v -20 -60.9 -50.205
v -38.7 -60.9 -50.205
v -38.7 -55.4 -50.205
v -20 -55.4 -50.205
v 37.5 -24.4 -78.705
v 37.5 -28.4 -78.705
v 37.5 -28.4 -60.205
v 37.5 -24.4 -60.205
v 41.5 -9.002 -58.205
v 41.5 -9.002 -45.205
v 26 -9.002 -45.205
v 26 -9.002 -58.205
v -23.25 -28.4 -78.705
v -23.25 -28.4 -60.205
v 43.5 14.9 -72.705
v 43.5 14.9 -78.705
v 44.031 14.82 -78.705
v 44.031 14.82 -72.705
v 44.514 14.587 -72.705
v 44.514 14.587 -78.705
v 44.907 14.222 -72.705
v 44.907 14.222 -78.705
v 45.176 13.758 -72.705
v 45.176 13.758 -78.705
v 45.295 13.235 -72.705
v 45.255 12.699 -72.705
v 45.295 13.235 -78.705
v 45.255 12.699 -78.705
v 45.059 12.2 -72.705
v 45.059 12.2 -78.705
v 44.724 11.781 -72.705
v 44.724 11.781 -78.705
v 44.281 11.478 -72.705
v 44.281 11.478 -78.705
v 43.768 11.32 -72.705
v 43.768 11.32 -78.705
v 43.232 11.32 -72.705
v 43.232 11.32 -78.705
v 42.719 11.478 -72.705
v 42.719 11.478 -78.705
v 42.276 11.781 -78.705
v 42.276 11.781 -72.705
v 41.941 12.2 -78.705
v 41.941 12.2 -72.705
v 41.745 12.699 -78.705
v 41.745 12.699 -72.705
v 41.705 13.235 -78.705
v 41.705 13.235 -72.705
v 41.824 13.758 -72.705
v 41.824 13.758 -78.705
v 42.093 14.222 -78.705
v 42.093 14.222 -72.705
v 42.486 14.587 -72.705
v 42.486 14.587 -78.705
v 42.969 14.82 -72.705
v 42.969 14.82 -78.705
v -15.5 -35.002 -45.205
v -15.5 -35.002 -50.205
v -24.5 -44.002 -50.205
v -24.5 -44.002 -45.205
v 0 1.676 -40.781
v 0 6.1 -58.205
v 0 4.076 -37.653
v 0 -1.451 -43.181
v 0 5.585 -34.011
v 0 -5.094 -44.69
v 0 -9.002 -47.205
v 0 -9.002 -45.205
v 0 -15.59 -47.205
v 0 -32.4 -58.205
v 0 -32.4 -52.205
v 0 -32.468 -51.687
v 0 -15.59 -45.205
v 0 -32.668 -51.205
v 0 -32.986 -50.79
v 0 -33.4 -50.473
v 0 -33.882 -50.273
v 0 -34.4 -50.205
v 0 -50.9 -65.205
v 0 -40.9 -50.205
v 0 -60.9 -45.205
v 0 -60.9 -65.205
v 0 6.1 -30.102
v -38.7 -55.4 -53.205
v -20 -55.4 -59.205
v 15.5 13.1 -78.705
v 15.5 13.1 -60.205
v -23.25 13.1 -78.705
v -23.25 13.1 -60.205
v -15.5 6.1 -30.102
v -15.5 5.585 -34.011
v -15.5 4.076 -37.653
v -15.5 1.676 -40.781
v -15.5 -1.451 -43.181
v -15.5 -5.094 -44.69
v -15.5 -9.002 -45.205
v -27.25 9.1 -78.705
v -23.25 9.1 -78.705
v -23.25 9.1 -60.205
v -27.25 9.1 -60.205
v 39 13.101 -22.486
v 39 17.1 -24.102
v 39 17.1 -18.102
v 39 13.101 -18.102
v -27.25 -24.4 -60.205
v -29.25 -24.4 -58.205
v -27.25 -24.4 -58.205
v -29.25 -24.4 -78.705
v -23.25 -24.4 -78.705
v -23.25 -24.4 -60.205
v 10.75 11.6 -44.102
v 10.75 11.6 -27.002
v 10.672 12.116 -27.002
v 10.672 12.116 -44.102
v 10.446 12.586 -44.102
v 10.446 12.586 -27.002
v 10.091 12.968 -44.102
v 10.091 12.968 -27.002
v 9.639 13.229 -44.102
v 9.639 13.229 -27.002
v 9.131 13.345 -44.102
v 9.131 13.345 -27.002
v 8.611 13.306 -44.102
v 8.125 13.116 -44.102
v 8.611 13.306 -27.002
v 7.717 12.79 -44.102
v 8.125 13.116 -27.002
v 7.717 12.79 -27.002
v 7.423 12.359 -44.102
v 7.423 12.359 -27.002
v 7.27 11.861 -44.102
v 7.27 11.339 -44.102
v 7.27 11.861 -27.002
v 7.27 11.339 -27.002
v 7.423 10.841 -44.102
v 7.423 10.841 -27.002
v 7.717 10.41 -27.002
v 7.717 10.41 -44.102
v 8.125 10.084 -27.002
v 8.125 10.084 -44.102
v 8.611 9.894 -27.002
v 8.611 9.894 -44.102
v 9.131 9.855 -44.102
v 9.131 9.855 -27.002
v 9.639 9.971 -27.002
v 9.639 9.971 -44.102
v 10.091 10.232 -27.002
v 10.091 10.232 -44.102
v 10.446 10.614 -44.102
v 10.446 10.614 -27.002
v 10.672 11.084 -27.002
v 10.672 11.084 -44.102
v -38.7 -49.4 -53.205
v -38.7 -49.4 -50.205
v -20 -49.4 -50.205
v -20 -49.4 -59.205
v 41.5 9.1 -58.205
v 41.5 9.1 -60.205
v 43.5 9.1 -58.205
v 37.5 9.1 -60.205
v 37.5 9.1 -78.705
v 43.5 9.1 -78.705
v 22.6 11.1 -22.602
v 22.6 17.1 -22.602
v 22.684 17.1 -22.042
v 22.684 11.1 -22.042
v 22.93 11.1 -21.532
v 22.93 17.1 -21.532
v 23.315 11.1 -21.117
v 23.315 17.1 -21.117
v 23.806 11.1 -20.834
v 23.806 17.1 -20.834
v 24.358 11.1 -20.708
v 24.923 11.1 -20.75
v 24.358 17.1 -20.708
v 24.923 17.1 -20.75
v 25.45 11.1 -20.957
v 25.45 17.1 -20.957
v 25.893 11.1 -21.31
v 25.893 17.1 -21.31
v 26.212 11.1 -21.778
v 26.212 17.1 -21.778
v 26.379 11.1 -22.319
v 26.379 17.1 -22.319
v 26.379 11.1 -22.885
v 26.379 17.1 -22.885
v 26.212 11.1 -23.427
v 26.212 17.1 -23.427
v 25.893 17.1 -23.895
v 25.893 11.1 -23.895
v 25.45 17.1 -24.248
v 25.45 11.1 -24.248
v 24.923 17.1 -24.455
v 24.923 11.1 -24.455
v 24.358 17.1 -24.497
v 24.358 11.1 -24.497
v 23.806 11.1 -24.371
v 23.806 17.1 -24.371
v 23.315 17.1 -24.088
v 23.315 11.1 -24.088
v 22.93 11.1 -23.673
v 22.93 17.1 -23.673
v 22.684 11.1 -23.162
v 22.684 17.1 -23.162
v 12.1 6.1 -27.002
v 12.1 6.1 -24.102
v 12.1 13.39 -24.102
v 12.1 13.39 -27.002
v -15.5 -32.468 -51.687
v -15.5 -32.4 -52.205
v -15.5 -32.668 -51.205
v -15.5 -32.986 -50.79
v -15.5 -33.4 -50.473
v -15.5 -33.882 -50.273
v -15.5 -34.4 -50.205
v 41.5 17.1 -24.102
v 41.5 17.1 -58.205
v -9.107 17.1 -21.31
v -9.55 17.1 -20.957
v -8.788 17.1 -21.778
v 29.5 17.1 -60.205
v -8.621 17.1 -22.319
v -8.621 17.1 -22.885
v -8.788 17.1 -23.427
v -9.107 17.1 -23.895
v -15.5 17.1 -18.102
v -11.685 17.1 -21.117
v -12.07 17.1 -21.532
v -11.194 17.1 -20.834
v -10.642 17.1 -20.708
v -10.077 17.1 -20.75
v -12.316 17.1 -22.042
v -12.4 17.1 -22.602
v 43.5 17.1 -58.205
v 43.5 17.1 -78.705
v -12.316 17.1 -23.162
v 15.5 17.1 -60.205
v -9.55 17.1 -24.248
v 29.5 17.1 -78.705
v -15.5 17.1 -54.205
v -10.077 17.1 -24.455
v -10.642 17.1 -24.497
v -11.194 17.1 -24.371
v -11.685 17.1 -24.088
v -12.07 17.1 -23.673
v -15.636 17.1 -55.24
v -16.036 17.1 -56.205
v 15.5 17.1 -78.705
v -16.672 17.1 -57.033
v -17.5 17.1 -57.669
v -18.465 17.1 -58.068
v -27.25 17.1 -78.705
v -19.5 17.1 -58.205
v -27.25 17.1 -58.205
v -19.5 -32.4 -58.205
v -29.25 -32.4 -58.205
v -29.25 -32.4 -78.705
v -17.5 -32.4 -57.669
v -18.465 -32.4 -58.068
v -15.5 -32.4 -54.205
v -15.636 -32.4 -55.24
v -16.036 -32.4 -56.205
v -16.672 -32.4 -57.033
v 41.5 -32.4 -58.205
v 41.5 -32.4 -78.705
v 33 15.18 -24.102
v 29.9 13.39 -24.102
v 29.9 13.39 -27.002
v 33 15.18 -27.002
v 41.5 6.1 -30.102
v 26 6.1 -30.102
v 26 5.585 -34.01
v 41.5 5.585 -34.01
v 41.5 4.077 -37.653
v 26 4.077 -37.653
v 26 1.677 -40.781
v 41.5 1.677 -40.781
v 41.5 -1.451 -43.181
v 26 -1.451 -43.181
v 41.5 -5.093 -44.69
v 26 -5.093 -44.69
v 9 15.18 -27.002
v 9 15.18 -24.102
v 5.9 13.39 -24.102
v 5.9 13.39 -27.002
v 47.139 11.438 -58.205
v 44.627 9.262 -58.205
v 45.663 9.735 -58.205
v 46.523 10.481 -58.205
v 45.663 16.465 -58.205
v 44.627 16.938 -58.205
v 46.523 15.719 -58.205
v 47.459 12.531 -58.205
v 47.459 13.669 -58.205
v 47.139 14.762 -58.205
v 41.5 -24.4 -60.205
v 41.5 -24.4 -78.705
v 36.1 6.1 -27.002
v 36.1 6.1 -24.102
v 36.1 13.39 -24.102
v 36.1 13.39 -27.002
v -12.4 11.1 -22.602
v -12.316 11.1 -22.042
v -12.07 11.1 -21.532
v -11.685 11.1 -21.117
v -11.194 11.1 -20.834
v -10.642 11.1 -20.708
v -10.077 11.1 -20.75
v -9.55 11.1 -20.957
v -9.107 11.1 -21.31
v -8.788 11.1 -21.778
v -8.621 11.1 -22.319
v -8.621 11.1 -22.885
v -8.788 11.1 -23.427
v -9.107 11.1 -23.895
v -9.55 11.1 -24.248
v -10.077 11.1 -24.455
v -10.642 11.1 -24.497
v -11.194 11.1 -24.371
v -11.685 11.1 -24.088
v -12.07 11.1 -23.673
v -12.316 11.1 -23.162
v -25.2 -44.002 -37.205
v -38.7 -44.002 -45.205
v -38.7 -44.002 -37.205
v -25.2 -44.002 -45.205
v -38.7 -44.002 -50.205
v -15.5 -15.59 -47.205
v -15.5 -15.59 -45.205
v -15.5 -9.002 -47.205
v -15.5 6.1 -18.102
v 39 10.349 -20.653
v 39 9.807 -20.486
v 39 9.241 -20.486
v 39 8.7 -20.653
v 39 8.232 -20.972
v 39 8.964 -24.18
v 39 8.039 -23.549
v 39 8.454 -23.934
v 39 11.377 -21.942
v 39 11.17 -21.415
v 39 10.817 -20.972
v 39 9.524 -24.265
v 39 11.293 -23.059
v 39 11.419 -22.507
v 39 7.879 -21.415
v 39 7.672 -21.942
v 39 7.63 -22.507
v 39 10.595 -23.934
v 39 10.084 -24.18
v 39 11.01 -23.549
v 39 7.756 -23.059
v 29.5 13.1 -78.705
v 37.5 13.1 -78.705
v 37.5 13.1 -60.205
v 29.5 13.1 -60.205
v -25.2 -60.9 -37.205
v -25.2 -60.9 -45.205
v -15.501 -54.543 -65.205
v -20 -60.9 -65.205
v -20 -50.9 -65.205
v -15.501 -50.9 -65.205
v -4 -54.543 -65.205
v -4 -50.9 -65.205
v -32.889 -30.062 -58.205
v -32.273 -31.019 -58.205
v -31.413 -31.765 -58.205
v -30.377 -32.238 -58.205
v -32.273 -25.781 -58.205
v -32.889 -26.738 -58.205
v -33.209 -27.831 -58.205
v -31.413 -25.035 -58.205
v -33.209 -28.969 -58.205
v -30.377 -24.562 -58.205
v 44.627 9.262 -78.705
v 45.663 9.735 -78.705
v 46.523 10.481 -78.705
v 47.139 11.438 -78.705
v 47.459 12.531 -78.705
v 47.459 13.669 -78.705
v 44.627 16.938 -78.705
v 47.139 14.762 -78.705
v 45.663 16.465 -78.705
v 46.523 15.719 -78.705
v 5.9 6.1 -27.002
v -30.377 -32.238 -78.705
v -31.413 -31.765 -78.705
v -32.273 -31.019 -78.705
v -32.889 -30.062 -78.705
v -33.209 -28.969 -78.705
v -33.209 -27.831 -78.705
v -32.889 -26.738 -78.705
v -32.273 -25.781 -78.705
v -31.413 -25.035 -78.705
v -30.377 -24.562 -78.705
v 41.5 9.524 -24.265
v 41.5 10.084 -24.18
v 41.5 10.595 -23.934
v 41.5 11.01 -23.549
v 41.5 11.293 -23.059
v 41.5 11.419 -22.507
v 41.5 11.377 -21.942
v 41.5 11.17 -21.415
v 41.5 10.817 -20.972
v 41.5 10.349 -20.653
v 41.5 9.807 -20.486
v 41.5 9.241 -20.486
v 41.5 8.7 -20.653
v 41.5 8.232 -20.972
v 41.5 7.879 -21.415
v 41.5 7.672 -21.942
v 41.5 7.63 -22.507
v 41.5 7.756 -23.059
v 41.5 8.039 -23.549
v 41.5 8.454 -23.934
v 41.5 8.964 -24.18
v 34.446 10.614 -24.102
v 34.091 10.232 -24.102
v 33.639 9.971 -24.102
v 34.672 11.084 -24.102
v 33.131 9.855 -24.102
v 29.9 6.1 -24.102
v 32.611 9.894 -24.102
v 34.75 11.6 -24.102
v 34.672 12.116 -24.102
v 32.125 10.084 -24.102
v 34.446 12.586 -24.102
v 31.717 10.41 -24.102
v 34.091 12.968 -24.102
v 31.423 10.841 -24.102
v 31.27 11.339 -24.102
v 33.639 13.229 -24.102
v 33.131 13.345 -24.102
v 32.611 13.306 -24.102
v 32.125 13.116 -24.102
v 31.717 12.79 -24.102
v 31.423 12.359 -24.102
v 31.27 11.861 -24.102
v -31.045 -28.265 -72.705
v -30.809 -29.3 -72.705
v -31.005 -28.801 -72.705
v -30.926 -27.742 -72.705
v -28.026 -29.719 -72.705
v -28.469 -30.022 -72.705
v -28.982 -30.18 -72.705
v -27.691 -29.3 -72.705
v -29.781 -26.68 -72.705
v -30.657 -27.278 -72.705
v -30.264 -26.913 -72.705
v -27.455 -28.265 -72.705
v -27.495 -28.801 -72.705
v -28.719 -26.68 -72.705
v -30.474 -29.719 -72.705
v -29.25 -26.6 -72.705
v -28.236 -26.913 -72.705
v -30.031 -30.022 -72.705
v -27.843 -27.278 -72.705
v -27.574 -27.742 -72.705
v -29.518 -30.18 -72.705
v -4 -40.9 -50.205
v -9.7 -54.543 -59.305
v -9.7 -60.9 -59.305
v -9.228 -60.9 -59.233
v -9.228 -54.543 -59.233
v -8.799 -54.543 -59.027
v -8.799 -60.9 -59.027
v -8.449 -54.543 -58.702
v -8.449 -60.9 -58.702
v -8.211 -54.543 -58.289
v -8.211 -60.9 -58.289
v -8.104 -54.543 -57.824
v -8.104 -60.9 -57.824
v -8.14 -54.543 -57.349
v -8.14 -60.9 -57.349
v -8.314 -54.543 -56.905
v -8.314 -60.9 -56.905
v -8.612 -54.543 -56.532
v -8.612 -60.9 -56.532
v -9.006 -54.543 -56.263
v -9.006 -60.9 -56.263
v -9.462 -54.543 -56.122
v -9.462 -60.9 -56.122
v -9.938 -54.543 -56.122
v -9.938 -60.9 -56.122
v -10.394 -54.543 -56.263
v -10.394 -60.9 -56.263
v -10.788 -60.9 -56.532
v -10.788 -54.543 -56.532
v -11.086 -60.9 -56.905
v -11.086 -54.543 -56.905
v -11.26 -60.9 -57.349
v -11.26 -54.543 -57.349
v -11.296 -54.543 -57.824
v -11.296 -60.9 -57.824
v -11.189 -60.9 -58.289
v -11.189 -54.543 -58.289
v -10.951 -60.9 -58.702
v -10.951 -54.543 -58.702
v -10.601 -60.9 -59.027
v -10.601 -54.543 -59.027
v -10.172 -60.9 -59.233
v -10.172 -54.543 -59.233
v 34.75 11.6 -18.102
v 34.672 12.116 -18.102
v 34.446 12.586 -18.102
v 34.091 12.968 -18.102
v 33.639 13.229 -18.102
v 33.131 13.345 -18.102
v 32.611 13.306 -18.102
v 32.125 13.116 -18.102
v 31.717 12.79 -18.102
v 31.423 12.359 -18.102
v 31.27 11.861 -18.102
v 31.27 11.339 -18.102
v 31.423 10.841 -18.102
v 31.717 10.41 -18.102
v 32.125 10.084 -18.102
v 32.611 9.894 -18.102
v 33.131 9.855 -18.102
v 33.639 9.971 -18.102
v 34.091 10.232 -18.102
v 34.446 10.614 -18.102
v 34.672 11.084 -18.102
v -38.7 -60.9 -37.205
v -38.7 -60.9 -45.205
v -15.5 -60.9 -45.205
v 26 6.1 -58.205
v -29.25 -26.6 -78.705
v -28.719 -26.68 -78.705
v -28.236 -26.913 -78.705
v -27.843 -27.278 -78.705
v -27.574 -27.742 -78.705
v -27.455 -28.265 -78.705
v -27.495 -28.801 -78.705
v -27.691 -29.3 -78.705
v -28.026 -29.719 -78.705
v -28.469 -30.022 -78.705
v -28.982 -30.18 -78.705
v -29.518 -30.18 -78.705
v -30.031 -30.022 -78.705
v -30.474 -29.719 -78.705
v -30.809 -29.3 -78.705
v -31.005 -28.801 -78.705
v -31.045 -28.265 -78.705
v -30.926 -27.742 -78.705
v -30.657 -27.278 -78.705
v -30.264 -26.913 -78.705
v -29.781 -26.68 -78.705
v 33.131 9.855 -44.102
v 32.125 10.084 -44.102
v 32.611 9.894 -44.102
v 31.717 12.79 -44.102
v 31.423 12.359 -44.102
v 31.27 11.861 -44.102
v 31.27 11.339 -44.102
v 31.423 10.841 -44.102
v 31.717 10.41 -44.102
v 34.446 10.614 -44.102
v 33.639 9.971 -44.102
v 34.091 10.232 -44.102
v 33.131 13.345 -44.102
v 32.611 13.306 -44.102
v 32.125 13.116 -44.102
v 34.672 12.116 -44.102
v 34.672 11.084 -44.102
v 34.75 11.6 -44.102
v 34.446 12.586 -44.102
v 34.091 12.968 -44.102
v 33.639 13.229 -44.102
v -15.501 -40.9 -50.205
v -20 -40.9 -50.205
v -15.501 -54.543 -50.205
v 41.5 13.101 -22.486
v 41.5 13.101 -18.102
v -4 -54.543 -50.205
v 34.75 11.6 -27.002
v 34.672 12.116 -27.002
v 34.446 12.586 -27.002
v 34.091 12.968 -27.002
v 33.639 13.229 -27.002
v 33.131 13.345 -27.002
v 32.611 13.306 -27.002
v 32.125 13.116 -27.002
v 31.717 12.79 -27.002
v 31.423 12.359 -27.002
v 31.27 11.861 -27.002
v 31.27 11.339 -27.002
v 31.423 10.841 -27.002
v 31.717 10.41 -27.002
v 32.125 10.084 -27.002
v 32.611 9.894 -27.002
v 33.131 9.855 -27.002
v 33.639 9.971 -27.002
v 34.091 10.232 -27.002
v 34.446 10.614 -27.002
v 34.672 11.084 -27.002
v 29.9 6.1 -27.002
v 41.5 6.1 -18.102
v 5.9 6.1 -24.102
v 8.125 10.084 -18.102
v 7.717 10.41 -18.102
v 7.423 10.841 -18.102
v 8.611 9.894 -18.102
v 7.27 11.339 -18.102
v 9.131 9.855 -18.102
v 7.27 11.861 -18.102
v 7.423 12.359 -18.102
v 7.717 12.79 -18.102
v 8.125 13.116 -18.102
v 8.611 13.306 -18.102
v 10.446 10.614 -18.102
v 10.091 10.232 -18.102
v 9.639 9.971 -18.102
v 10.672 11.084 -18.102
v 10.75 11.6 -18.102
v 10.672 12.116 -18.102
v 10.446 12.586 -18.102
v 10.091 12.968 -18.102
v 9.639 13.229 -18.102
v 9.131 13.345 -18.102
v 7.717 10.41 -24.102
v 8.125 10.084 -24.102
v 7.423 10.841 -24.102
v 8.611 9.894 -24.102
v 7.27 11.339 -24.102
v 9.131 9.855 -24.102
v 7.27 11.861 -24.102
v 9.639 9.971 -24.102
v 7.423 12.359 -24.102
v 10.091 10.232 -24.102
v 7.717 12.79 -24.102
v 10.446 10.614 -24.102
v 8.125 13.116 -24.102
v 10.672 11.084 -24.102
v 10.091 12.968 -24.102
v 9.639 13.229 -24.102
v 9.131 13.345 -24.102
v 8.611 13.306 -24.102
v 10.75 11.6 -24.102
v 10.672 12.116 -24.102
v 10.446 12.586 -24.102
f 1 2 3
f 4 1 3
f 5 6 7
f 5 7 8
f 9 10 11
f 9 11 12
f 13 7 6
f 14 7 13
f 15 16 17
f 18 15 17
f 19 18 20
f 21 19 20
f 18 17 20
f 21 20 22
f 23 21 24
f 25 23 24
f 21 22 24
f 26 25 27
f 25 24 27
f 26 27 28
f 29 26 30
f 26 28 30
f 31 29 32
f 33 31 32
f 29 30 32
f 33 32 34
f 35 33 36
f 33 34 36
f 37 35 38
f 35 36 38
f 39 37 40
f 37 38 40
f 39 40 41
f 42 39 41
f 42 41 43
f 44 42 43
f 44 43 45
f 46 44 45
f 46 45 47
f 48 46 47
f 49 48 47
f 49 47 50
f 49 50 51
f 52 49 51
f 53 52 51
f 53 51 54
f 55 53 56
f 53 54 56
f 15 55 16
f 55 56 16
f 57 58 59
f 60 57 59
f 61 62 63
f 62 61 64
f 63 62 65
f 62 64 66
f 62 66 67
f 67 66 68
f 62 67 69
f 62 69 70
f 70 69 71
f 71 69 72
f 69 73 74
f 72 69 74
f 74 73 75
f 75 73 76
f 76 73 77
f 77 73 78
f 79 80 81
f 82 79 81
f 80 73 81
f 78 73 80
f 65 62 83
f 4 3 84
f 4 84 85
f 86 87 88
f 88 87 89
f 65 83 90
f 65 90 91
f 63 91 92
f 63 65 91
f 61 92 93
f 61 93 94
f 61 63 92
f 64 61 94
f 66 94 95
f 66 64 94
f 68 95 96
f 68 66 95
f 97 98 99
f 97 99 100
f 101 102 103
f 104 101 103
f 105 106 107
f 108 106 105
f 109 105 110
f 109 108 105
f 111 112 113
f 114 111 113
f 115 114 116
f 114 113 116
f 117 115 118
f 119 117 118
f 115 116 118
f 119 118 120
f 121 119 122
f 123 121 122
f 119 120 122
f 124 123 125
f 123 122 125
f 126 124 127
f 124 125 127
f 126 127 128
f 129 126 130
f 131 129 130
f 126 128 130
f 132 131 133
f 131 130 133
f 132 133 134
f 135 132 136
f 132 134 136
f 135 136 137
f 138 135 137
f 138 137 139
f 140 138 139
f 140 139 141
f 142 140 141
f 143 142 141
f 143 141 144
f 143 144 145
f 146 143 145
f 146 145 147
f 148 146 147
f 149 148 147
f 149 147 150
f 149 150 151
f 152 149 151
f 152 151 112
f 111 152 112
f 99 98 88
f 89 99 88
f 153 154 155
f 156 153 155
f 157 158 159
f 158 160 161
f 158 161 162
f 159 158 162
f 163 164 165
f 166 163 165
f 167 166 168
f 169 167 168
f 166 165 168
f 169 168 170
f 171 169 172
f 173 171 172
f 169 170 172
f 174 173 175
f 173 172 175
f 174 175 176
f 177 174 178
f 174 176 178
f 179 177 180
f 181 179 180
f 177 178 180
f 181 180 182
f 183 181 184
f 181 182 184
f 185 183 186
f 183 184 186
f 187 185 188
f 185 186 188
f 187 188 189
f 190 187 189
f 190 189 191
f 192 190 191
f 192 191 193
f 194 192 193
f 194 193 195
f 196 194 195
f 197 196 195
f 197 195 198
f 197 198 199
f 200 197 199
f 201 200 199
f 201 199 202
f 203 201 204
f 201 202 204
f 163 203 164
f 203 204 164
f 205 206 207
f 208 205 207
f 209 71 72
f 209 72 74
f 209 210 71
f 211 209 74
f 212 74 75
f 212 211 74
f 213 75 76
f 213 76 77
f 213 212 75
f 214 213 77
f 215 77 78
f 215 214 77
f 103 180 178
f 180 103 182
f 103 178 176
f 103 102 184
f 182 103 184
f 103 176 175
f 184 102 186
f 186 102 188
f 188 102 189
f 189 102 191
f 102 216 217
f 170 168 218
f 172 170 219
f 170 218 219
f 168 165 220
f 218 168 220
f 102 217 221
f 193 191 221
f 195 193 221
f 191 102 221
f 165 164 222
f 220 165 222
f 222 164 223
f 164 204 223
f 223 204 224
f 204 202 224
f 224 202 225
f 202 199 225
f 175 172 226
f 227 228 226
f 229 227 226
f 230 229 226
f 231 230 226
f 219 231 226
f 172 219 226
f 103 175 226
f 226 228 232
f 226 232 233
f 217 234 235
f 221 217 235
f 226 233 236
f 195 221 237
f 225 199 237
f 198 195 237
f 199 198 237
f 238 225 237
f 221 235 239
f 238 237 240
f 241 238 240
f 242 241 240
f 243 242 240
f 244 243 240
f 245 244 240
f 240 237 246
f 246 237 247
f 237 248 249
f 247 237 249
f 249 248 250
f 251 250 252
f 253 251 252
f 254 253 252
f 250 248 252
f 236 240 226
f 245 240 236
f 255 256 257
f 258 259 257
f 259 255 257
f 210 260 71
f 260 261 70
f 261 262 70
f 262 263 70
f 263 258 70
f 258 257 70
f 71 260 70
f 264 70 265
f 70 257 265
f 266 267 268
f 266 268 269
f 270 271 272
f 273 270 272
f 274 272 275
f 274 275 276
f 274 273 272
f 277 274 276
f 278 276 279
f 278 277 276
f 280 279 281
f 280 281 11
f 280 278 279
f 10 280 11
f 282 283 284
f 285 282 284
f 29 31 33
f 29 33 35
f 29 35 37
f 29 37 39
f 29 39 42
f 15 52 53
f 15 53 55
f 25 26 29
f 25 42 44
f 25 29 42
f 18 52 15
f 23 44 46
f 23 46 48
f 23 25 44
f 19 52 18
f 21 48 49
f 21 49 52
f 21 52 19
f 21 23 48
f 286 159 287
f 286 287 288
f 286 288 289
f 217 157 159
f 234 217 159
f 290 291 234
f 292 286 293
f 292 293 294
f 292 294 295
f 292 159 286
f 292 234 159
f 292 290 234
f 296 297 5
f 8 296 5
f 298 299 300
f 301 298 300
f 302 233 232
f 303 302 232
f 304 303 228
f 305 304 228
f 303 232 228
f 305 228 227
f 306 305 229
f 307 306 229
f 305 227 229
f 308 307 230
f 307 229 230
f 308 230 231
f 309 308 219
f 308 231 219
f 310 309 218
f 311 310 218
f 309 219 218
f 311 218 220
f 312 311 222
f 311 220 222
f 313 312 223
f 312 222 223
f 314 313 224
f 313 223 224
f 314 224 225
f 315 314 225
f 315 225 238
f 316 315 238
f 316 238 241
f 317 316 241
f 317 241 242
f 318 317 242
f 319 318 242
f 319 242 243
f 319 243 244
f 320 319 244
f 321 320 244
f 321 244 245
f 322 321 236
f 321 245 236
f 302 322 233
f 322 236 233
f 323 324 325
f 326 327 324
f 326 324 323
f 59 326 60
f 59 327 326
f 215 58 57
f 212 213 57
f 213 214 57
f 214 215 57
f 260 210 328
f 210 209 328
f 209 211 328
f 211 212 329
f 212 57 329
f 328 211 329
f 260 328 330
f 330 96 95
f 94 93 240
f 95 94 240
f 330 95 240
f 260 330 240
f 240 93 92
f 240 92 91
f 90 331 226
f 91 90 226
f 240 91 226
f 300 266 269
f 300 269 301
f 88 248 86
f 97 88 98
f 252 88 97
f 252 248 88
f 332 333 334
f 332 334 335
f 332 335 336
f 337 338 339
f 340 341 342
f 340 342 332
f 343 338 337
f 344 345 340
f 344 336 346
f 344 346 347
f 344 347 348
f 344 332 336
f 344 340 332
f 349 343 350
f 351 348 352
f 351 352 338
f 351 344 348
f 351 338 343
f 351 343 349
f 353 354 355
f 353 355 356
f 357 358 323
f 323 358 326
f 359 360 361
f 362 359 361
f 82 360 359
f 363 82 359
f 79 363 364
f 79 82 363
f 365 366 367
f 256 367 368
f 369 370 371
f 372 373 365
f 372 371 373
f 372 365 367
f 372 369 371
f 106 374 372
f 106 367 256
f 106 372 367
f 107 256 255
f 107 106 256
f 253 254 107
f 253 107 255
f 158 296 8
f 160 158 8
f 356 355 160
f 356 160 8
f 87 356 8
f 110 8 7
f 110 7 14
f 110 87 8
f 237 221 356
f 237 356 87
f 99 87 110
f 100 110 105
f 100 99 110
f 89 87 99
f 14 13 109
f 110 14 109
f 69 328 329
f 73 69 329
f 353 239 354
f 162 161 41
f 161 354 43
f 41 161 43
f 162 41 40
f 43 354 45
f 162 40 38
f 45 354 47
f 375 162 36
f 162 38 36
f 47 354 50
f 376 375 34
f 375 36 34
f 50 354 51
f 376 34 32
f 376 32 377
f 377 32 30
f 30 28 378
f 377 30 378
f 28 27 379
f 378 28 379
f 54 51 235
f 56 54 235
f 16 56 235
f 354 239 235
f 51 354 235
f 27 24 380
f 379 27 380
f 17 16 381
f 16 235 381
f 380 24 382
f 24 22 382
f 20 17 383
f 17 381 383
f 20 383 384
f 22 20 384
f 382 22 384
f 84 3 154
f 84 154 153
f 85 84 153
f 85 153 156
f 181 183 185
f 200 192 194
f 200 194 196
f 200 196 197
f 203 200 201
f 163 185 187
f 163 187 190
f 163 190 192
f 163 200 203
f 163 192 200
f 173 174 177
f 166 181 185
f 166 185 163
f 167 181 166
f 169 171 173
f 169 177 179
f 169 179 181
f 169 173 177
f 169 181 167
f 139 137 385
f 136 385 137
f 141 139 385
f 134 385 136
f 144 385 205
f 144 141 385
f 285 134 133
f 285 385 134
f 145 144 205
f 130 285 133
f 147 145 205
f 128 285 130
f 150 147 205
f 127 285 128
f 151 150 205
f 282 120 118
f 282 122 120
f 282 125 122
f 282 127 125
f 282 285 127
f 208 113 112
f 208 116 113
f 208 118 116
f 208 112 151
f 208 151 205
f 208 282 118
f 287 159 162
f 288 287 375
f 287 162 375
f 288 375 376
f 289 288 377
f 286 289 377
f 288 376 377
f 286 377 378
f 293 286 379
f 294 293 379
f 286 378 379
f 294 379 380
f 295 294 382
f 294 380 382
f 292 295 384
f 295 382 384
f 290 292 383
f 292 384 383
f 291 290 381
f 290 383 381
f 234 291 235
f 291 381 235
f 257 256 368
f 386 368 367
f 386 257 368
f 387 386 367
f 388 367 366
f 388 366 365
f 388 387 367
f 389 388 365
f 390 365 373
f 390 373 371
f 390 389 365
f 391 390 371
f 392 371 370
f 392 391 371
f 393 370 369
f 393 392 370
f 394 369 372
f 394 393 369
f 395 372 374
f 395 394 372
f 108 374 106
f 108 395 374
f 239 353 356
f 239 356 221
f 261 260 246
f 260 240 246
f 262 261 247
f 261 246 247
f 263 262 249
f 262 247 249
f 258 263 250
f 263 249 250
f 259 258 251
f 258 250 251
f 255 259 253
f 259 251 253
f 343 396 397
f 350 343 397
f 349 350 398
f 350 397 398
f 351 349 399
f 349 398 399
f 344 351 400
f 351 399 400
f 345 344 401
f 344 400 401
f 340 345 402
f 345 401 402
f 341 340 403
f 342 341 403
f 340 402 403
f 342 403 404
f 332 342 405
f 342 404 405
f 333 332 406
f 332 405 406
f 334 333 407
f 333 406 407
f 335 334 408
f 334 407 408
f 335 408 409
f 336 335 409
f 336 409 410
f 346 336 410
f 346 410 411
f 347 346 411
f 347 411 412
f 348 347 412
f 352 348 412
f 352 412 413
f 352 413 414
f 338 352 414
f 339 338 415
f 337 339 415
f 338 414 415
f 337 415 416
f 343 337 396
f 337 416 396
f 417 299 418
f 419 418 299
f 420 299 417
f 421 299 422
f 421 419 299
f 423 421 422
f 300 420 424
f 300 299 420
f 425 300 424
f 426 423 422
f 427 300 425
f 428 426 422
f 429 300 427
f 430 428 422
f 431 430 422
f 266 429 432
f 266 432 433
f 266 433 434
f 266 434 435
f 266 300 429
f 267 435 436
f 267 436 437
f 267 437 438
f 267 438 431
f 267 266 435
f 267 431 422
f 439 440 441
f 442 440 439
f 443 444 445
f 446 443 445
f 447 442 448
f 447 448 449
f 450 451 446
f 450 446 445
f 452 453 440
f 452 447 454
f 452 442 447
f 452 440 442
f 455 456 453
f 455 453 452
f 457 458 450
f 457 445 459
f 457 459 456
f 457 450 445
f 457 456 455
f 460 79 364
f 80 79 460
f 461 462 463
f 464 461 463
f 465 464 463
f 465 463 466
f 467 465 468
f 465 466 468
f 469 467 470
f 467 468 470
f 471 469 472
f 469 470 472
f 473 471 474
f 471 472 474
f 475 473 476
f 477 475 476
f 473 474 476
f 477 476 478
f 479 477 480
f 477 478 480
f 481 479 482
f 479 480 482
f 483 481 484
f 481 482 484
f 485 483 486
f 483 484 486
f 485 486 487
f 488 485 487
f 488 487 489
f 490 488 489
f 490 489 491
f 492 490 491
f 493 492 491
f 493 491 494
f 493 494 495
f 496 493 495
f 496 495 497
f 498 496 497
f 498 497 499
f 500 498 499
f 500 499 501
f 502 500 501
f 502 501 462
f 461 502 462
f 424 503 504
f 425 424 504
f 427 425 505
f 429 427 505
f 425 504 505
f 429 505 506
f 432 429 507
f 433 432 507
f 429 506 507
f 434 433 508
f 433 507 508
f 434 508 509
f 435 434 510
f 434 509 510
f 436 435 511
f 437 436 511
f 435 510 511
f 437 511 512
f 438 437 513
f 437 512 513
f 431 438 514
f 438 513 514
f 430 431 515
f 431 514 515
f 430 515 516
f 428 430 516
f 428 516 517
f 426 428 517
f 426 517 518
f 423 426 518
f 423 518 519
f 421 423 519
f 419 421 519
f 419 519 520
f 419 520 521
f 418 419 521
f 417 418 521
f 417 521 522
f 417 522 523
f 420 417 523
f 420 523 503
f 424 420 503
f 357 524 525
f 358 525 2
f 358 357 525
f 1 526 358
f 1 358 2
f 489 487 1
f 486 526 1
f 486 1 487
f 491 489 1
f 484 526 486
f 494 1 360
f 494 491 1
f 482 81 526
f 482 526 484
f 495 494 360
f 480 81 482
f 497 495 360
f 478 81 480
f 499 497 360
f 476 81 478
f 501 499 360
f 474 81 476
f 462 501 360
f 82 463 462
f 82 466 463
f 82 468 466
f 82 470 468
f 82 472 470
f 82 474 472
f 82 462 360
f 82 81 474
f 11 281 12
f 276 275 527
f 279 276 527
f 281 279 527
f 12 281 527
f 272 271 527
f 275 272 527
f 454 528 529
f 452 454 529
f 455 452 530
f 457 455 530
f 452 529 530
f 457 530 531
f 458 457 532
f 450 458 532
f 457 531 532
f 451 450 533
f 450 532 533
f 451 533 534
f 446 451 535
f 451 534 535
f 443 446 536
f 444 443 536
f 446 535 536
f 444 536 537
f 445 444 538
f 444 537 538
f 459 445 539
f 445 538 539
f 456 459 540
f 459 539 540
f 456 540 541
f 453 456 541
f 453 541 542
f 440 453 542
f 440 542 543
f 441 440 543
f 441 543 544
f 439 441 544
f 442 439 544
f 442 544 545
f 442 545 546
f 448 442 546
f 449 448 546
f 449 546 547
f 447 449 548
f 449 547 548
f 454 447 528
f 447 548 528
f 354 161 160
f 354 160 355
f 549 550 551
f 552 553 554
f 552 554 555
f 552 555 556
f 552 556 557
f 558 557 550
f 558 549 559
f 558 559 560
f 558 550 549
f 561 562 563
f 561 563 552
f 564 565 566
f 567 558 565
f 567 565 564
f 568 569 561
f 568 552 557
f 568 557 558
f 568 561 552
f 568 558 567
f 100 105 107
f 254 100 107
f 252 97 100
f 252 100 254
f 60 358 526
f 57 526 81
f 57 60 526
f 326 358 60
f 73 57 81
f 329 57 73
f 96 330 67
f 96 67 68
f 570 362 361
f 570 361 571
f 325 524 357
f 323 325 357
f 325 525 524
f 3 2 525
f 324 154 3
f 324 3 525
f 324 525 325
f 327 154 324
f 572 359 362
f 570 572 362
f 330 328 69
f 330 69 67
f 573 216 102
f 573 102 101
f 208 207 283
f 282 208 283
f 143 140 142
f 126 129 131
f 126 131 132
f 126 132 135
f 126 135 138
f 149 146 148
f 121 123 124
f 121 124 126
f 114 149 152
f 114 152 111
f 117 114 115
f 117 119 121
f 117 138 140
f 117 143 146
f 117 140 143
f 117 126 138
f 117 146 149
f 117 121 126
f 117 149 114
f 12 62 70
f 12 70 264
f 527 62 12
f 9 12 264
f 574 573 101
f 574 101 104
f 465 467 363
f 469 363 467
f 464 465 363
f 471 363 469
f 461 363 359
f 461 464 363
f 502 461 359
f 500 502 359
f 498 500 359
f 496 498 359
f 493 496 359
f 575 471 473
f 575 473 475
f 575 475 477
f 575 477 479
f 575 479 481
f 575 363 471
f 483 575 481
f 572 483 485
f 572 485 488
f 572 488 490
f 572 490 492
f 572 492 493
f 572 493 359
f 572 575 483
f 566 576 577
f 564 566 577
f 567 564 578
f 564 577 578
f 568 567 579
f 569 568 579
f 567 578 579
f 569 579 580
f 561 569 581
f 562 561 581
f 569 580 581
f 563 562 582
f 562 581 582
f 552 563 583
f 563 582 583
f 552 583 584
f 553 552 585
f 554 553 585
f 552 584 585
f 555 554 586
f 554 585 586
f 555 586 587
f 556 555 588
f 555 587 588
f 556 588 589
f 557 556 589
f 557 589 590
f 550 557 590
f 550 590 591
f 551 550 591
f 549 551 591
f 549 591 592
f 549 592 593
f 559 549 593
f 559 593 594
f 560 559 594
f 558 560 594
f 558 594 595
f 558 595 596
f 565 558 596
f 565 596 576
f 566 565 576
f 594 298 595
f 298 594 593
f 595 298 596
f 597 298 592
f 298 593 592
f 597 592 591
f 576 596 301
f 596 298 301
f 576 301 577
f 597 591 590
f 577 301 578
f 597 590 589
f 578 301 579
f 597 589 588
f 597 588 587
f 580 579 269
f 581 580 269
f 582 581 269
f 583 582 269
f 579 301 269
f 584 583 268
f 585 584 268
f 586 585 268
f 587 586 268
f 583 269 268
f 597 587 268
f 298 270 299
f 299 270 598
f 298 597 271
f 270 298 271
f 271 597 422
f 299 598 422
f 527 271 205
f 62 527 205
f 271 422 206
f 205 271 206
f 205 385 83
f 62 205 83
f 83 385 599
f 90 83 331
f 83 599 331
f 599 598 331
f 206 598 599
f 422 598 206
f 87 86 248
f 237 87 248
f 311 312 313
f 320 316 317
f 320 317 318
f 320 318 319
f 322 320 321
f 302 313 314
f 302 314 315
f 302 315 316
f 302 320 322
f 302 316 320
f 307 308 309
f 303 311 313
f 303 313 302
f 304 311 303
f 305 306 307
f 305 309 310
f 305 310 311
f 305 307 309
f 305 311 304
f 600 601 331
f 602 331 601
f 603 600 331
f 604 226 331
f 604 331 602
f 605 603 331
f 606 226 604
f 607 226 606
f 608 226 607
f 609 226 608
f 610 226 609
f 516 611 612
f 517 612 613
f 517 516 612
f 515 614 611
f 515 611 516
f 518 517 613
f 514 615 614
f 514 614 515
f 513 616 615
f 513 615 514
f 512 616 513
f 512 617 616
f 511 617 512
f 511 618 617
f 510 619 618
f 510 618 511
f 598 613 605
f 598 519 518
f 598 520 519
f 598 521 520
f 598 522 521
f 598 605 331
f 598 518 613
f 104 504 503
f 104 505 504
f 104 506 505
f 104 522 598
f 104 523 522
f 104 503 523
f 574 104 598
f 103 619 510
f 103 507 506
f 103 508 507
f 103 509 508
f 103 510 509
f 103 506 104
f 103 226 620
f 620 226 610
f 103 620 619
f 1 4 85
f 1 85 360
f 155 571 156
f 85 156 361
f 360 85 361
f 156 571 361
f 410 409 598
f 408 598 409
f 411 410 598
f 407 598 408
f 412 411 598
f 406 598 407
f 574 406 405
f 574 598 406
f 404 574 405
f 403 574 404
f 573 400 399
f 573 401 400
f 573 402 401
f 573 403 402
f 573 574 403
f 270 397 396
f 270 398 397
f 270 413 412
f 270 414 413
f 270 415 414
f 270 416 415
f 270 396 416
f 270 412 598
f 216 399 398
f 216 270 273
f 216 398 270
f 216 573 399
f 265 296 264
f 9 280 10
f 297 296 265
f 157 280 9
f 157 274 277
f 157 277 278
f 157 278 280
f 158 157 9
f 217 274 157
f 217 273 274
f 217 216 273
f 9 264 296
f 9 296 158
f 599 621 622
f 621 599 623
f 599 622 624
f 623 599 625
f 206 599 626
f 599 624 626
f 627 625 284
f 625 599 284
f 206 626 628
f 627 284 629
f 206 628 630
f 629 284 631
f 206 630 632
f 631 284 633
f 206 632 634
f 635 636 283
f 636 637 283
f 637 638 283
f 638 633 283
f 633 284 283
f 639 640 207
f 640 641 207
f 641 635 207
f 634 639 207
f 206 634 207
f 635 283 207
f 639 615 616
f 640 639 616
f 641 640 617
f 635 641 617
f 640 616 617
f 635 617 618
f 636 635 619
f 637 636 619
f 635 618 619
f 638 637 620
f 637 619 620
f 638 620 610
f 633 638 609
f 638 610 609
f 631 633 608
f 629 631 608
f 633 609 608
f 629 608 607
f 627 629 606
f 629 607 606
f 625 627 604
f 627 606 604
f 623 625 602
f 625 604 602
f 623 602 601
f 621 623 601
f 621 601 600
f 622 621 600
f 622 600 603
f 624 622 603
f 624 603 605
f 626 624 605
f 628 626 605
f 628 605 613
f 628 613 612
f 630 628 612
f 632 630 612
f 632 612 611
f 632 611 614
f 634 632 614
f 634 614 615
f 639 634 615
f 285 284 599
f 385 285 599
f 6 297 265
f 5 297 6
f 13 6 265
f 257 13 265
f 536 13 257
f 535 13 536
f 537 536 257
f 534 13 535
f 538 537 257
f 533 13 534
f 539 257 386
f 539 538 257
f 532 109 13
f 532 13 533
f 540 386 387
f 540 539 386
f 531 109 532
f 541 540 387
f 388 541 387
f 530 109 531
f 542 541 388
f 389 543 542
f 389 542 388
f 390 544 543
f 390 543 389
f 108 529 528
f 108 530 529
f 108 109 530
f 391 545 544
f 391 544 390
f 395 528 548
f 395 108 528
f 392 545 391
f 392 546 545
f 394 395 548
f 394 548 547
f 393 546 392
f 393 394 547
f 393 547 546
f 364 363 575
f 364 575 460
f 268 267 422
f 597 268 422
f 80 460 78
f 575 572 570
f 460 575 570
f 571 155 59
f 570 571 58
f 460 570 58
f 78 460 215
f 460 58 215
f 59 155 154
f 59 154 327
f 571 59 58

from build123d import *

# Parameters (mm, degrees)
RESSALTO_EXTRUS_O1_DEPTH  = 5
RESSALTO_EXTRUS_O2_DEPTH  = 15.5
RESSALTO_EXTRUS_O3_DEPTH  = 15.5
RESSALTO_EXTRUS_O4_DEPTH  = 20
ESBO_O6_W                 = 5
ESBO_O6_H                 = 16.897720337
RESSALTO_EXTRUS_O5_DEPTH  = 23.2
ESBO_O7_W                 = 13.499987793
ESBO_O7_H                 = 16.897720337
RESSALTO_EXTRUS_O6_DEPTH  = 8
ESBO_O8_W                 = 2.000000014
ESBO_O8_H                 = 6.588073731
CORTE_EXTRUS_O1_DEPTH     = 93.188310305
CHANFRO2_SIZE             = 9
RESSALTO_EXTRUS_O8_DEPTH  = 4.5
RESSALTO_EXTRUS_O7_START  = -5.5
RESSALTO_EXTRUS_O7_DEPTH  = 6
CORTE_EXTRUS_O2_REACH     = 102.674
ESBO_O11_W                = 11.999984741
ESBO_O11_H                = 13.640792847
CORTE_EXTRUS_O4_REACH     = 108.65
ESBO_O13_R                = 1.6
RESSALTO_EXTRUS_O9_DEPTH  = 5
ESBO_O16_W                = 11.500915527
ESBO_O16_H                = 13.642723083
CORTE_EXTRUS_O5_DEPTH     = 101.673633611
RESSALTO_EXTRUS_O13_START = -15.5
ESBO_O18_W                = 32.102264404
ESBO_O18_H                = 11
RESSALTO_EXTRUS_O13_DEPTH = 77.5
ESBO_O27_W                = 32.102264404
ESBO_O27_H                = 11
CORTE_EXTRUS_O8_DEPTH     = 20.5
ESBO_O29_R                = 1.9
CORTE_EXTRUS_O9_DEPTH     = 2.5
ESBO_O30_R                = 1.9
CORTE_EXTRUS_O10_DEPTH    = 6
ESBO_O32_W                = 20
ESBO_O32_H                = 78
CORTE_EXTRUS_O11_DEPTH    = 88.462468019
ESBO_O33_R                = 1.75
CORTE_EXTRUS_O12_DEPTH    = 26
CORTE_EXTRUS_O13_START    = -6
CORTE_EXTRUS_O13_DEPTH    = 2.9
RESSALTO_EXTRUS_O20_DEPTH = 10
ESBO_O40_W                = 68.75
ESBO_O40_H                = 49.5
ESBO_O40_W_2              = 60.75
ESBO_O40_H_2              = 41.5
RESSALTO_EXTRUS_O21_DEPTH = 18.5
ESBO_O41_W                = 11.75
ESBO_O41_H                = 49.5
ESBO_O41_W_2              = 41.5
ESBO_O41_H_2              = 38.5
RESSALTO_EXTRUS_O22_DEPTH = 2
RESSALTO_EXTRUS_O23_DEPTH = 15.5
ESBO_O43_W                = 4
ESBO_O43_H                = 33.5
ESBO_O43_W_2              = 14
ESBO_O43_H_2              = 4
CORTE_EXTRUS_O14_DEPTH    = 18.5
RESSALTO_EXTRUS_O24_DEPTH = 20.5
ESBO_O45_R                = 1.8
CORTE_EXTRUS_O15_DEPTH    = 6
FILETE1_R                 = 4
FILETE2_R                 = 2


with BuildPart() as part:
    # Esboço2 → Ressalto-extrusão1 (new body)
    with BuildSketch(Plane.XY):
        Polygon((0, 0), (0, -60.9), (-20, -60.9), (-20, -25.9), (-15.5, -15.9), (-15.5, 0), align=None)
    extrude(amount=RESSALTO_EXTRUS_O1_DEPTH)

    # Esboço3 → Ressalto-extrusão2 (add)
    with BuildSketch(Plane(origin=(0, 0, 0), x_dir=(0, 0, -1), z_dir=(1, 0, 0))):
        with BuildLine():
            ThreePointArc((6.102294922, 14.1), (-2.871049482, 9.744626932), (-5, 0))
            Line((-5, 0), (0, 0))
            ThreePointArc((0, 0), (1.788130128, 4.313492501), (6.102294922, 6.1))
            Line((6.102294922, 6.1), (30.102294922, 6.1))
            ThreePointArc((30.102294922, 6.099999986), (40.781022689, 1.676452573), (45.204559313, -9.002279663))
            Line((45.204559326, -9.002279663), (45.204559326, -60.9))
            Line((45.204559326, -60.9), (50.204559326, -60.9))
            Line((50.204559326, -60.9), (50.204559326, 14.1))
            Line((50.204559326, 14.1), (6.102294922, 14.1))
        make_face()
    extrude(amount=-RESSALTO_EXTRUS_O2_DEPTH)

    # Esboço4 → Ressalto-extrusão3 (add)
    with BuildSketch(Plane.ZY.offset(15.5)):
        Polygon((-50.204559326, -60.9), (-50.204559326, -40.9), (-65.204559326, -50.9), (-65.204559326, -60.9), align=None)
    extrude(amount=-RESSALTO_EXTRUS_O3_DEPTH)

    # Esboço5 → Ressalto-extrusão4 (add)
    with BuildSketch(Plane.ZY.offset(20)):
        Polygon((5, -60.9), (20, -60.9), (20, -50.9), (5, -40.9), align=None)
    extrude(amount=-RESSALTO_EXTRUS_O4_DEPTH)

    # Esboço6 → Ressalto-extrusão5 (add)
    with BuildSketch(Plane.ZY.offset(15.5)):
        with Locations((-47.704559326, -52.451139832)):
            Rectangle(ESBO_O6_W, ESBO_O6_H)
    extrude(amount=RESSALTO_EXTRUS_O5_DEPTH)

    # Esboço7 → Ressalto-extrusão6 (add)
    with BuildSketch(Plane.XY.offset(-45.204559326)):
        with Locations((-31.950006104, -52.451139832)):
            Rectangle(ESBO_O7_W, ESBO_O7_H)
    extrude(amount=RESSALTO_EXTRUS_O6_DEPTH)

    # Esboço8 → Corte-extrusão1 (cut, through all)
    with BuildSketch(Plane.ZY.offset(15.5)):
        with Locations((-46.204559319, -12.296316529)):
            Rectangle(ESBO_O8_W, ESBO_O8_H)
    extrude(amount=-CORTE_EXTRUS_O1_DEPTH, mode=Mode.SUBTRACT)

    # Chanfro2
    # the kernel refuses this chamfer: 9 mm, written as the material it adds along each edge
    with BuildSketch(Plane(origin=(-15.5, -44.002279663, -50.204559326), x_dir=(0.027495876610586407, 0.9996219169112969, 0), z_dir=(0, 0, 1))) as chanfro2_piece_1:
        Polygon((CHANFRO2_SIZE * 0.999621916911, CHANFRO2_SIZE * 0.0274958766106), (-CHANFRO2_SIZE * 0.0274958766106, CHANFRO2_SIZE * 0.999621916911), (0, 0), align=None)
    extrude(amount=5)

    # Esboço10 → Ressalto-extrusão8 (add)
    with BuildSketch(Plane.ZY.offset(15.5)):
        Polygon((-50.204559326, -40.9), (-50.204559326, -60.9), (-65.204559326, -60.9), (-65.204559326, -50.9), align=None)
    extrude(amount=RESSALTO_EXTRUS_O8_DEPTH)

    # Esboço9 → Ressalto-extrusão7 (add)
    with BuildSketch(Plane.XZ.offset(60.9).offset(RESSALTO_EXTRUS_O7_START)):
        Polygon((-38.7, -50.204559326), (-38.700004578, -53.204559326), (-20, -59.204559326), (-20, -50.204559326), align=None)
    extrude(amount=-RESSALTO_EXTRUS_O7_DEPTH)

    # Corte-extrusão2: up to this face of the body (flat: up to its plane)
    corte_extrus_o2_end = Plane(part.part.faces().sort_by_distance((-10, -45.9, 12.5))[0])
    # Esboço11 → Corte-extrusão2 (cut, up to the picked face)
    with BuildSketch(Plane.XY.offset(5), mode=Mode.PRIVATE) as corte_extrus_o2_sk1:
        with Locations((-10.00000763, -47.720396424)):
            Rectangle(ESBO_O11_W, ESBO_O11_H)
    corte_extrus_o2_tool1 = split(extrude(corte_extrus_o2_sk1.sketch, amount=CORTE_EXTRUS_O2_REACH, mode=Mode.PRIVATE), bisect_by=corte_extrus_o2_end, keep=Keep.BOTH, mode=Mode.PRIVATE)
    add(corte_extrus_o2_tool1.solids().sort_by(Axis((-10.000008, -47.720396, 5), (0, 0, 1)))[0], mode=Mode.SUBTRACT)

    # Esboço13 → Corte-extrusão4 (cut, up to next)
    with BuildSketch(Plane.XZ.offset(60.9), mode=Mode.PRIVATE) as corte_extrus_o4_sk1:
        with Locations(Location((-10, 12.5, 0), (0, 0, 270))):
            Circle(ESBO_O13_R)
    corte_extrus_o4_tool1 = extrude(corte_extrus_o4_sk1.sketch, amount=-CORTE_EXTRUS_O4_REACH, mode=Mode.PRIVATE) & part.part
    # Esboço13 → Corte-extrusão4 (cut, up to next)
    with BuildSketch(Plane.XZ.offset(60.9), mode=Mode.PRIVATE) as corte_extrus_o4_sk2:
        with Locations(Location((-9.7, -57.704559326, 0), (0, 0, 270))):
            Circle(ESBO_O13_R)
    corte_extrus_o4_tool2 = extrude(corte_extrus_o4_sk2.sketch, amount=-CORTE_EXTRUS_O4_REACH, mode=Mode.PRIVATE) & part.part
    add(corte_extrus_o4_tool1.solids().sort_by_distance((-10, -60.9, 12.5))[0], mode=Mode.SUBTRACT)
    add(corte_extrus_o4_tool2.solids().sort_by_distance((-9.7, -60.9, -57.704559))[0], mode=Mode.SUBTRACT)

    # Esboço14 → Ressalto-extrusão9 (add)
    with BuildSketch(Plane.XY.offset(5)):
        Polygon((-10.75, 0), (-4.75, 0), (-4.75, -15.9), (-7.000007629, -25.9), (-7.000007629, -40.9), (-13.000007629, -40.9), (-13.000007629, -25.9), (-10.75, -15.9), align=None)
    extrude(amount=RESSALTO_EXTRUS_O9_DEPTH)

    # Esboço16 → Corte-extrusão5 (cut, through all)
    with BuildSketch(Plane(origin=(0, 0, -50.204559326), x_dir=(-1, 0, 0), z_dir=(0, 0, -1))):
        with Locations((9.750457764, -47.721361542)):
            Rectangle(ESBO_O16_W, ESBO_O16_H)
    extrude(amount=CORTE_EXTRUS_O5_DEPTH, mode=Mode.SUBTRACT)

    # Esboço18 → Ressalto-extrusão13 (add)
    with BuildSketch(Plane(origin=(0, 0, 0), x_dir=(0, 0, -1), z_dir=(1, 0, 0)).offset(RESSALTO_EXTRUS_O13_START)):
        with Locations((34.153427124, 11.6)):
            Rectangle(ESBO_O18_W, ESBO_O18_H)
    extrude(amount=RESSALTO_EXTRUS_O13_DEPTH)

    # Esboço27 → Corte-extrusão8 (cut)
    with BuildSketch(Plane(origin=(62, 0, 0), x_dir=(0, 0, -1), z_dir=(1, 0, 0))):
        with Locations((34.153427124, 11.6)):
            Rectangle(ESBO_O27_W, ESBO_O27_H)
    extrude(amount=-CORTE_EXTRUS_O8_DEPTH, mode=Mode.SUBTRACT)

    # Esboço29 → Corte-extrusão9 (cut)
    with BuildSketch(Plane(origin=(41.5, 0, 0), x_dir=(0, 0, -1), z_dir=(1, 0, 0))):
        with Locations((22.364620491, 9.524231873)):
            Circle(ESBO_O29_R)
        Polygon((24.102294922, 17.1), (22.486408956, 13.10054189), (18.102294922, 13.10054189), (18.102294922, 17.1), align=None)
    extrude(amount=-CORTE_EXTRUS_O9_DEPTH, mode=Mode.SUBTRACT)

    # Esboço30 → Corte-extrusão10 (cut)
    with BuildSketch(Plane(origin=(0, 17.1, 0), x_dir=(1, 0, 0), z_dir=(0, 1, 0))):
        with Locations(Location((-10.5, 22.602294922, 0), (0, 0, 180))):
            Circle(ESBO_O30_R)
        with Locations(Location((24.5, 22.602294922, 0), (0, 0, 180))):
            Circle(ESBO_O30_R)
    extrude(amount=-CORTE_EXTRUS_O10_DEPTH, mode=Mode.SUBTRACT)

    # Esboço32 → Corte-extrusão11 (cut, through all)
    with BuildSketch(Plane.XY.offset(-18.102294922)):
        with Locations((-10, -21.9)):
            Rectangle(ESBO_O32_W, ESBO_O32_H)
    extrude(amount=CORTE_EXTRUS_O11_DEPTH, mode=Mode.SUBTRACT)

    # Esboço33 → Corte-extrusão12 (cut)
    with BuildSketch(Plane.XY.offset(-18.102294922)):
        with Locations((9, 11.6)):
            Circle(ESBO_O33_R)
        with Locations((33, 11.6)):
            Circle(ESBO_O33_R)
    extrude(amount=-CORTE_EXTRUS_O12_DEPTH, mode=Mode.SUBTRACT)

    # Esboço34 → Corte-extrusão13 (cut)
    with BuildSketch(Plane.XY.offset(-18.102294922).offset(CORTE_EXTRUS_O13_START)):
        Polygon((9, 15.179571669), (5.9, 13.389785834), (5.9, 9.810214166), (5.9, 6.1), (12.1, 6.1), (12.1, 9.810214166), (12.1, 13.389785834), align=None)
        Polygon((29.9, 6.1), (29.9, 9.810214166), (29.9, 13.389785834), (33, 15.179571669), (36.1, 13.389785834), (36.1, 9.810214166), (36.1, 6.1), align=None)
    extrude(amount=-CORTE_EXTRUS_O13_DEPTH, mode=Mode.SUBTRACT)

    # Esboço39 → Ressalto-extrusão20 (add)
    with BuildSketch(Plane(origin=(0, 0, -50.204559326), x_dir=(-1, 0, 0), z_dir=(0, 0, -1))):
        Polygon((-41.5, 17.1), (-41.5, 6.1), (0, 6.1), (0, -32.4), (15.5, -32.4), (15.5, 17.1), align=None)
    extrude(amount=RESSALTO_EXTRUS_O20_DEPTH)

    # Esboço40 → Ressalto-extrusão21 (add)
    with BuildSketch(Plane(origin=(0, 0, -60.204559326), x_dir=(-1, 0, 0), z_dir=(0, 0, -1))):
        with Locations((-7.125, -7.65)):
            Rectangle(ESBO_O40_W, ESBO_O40_H)
        with Locations((-7.125, -7.65)):
            Rectangle(ESBO_O40_W_2, ESBO_O40_H_2, mode=Mode.SUBTRACT)
    extrude(amount=RESSALTO_EXTRUS_O21_DEPTH)

    # Esboço41 → Ressalto-extrusão22 (add)
    with BuildSketch(Plane.XY.offset(-60.204559326)):
        with Locations((-21.375, -7.65)):
            Rectangle(ESBO_O41_W, ESBO_O41_H)
        with Locations((20.75, -13.15)):
            Rectangle(ESBO_O41_W_2, ESBO_O41_H_2)
    extrude(amount=RESSALTO_EXTRUS_O22_DEPTH)

    # Esboço42 → Ressalto-extrusão23 (add)
    with BuildSketch(Plane(origin=(41.5, 0, 0), x_dir=(0, 0, -1), z_dir=(1, 0, 0))):
        with BuildLine():
            Line((45.204559312, -9.002279663), (58.204559326, -9.002279663))
            Line((58.204559326, -9.002279663), (58.204559326, 6.1))
            Line((58.204559326, 6.1), (30.101642126, 6.1))
            ThreePointArc((30.101642126, 6.1), (40.780791888, 1.676683369), (45.204559312, -9.002279663))
        make_face()
    extrude(amount=-RESSALTO_EXTRUS_O23_DEPTH)

    # Esboço43 → Corte-extrusão14 (cut)
    with BuildSketch(Plane(origin=(0, 0, -78.704559326), x_dir=(-1, 0, 0), z_dir=(0, 0, -1))):
        with Locations((-39.5, -7.65)):
            Rectangle(ESBO_O43_W, ESBO_O43_H)
        with Locations((25.25, -7.65)):
            Rectangle(ESBO_O43_W, ESBO_O43_H)
        with Locations((-22.5, 15.1)):
            Rectangle(ESBO_O43_W_2, ESBO_O43_H_2)
    extrude(amount=-CORTE_EXTRUS_O14_DEPTH, mode=Mode.SUBTRACT)

    # Esboço44 → Ressalto-extrusão24 (add)
    with BuildSketch(Plane(origin=(0, 0, -78.704559326), x_dir=(-1, 0, 0), z_dir=(0, 0, -1))):
        with BuildLine():
            Line((-43.5, 17.1), (-41.5, 17.1))
            Line((-41.5, 17.1), (-41.5, 9.1))
            Line((-41.5, 9.1), (-43.5, 9.1))
            ThreePointArc((-43.5, 9.1), (-47.5, 13.1), (-43.5, 17.1))
        make_face()
        with BuildLine():
            Line((29.25, -24.4), (27.25, -24.4))
            Line((27.25, -24.4), (27.25, -32.4))
            Line((27.25, -32.4), (29.25, -32.4))
            ThreePointArc((29.25, -32.4), (33.25, -28.4), (29.25, -24.4))
        make_face()
    extrude(amount=-RESSALTO_EXTRUS_O24_DEPTH)

    # Esboço45 → Corte-extrusão15 (cut)
    with BuildSketch(Plane(origin=(0, 0, -78.704559326), x_dir=(-1, 0, 0), z_dir=(0, 0, -1))):
        with Locations(Location((-43.5, 13.1, 0), (0, 0, 90))):
            Circle(ESBO_O45_R)
        with Locations(Location((29.25, -28.4, 0), (0, 0, 90))):
            Circle(ESBO_O45_R)
    extrude(amount=-CORTE_EXTRUS_O15_DEPTH, mode=Mode.SUBTRACT)

    # Filete1
    filete1_edges = [part.edges().sort_by_distance(p)[0] for p in [
        (-15.5, -7.65, -58.204559326),
    ]]
    fillet(filete1_edges, radius=FILETE1_R)

    # Filete2
    filete2_edges = [part.edges().sort_by_distance(p)[0] for p in [
        (-7.75, -32.4, -50.204559326),
    ]]
    fillet(filete2_edges, radius=FILETE2_R)


solid = part.part
